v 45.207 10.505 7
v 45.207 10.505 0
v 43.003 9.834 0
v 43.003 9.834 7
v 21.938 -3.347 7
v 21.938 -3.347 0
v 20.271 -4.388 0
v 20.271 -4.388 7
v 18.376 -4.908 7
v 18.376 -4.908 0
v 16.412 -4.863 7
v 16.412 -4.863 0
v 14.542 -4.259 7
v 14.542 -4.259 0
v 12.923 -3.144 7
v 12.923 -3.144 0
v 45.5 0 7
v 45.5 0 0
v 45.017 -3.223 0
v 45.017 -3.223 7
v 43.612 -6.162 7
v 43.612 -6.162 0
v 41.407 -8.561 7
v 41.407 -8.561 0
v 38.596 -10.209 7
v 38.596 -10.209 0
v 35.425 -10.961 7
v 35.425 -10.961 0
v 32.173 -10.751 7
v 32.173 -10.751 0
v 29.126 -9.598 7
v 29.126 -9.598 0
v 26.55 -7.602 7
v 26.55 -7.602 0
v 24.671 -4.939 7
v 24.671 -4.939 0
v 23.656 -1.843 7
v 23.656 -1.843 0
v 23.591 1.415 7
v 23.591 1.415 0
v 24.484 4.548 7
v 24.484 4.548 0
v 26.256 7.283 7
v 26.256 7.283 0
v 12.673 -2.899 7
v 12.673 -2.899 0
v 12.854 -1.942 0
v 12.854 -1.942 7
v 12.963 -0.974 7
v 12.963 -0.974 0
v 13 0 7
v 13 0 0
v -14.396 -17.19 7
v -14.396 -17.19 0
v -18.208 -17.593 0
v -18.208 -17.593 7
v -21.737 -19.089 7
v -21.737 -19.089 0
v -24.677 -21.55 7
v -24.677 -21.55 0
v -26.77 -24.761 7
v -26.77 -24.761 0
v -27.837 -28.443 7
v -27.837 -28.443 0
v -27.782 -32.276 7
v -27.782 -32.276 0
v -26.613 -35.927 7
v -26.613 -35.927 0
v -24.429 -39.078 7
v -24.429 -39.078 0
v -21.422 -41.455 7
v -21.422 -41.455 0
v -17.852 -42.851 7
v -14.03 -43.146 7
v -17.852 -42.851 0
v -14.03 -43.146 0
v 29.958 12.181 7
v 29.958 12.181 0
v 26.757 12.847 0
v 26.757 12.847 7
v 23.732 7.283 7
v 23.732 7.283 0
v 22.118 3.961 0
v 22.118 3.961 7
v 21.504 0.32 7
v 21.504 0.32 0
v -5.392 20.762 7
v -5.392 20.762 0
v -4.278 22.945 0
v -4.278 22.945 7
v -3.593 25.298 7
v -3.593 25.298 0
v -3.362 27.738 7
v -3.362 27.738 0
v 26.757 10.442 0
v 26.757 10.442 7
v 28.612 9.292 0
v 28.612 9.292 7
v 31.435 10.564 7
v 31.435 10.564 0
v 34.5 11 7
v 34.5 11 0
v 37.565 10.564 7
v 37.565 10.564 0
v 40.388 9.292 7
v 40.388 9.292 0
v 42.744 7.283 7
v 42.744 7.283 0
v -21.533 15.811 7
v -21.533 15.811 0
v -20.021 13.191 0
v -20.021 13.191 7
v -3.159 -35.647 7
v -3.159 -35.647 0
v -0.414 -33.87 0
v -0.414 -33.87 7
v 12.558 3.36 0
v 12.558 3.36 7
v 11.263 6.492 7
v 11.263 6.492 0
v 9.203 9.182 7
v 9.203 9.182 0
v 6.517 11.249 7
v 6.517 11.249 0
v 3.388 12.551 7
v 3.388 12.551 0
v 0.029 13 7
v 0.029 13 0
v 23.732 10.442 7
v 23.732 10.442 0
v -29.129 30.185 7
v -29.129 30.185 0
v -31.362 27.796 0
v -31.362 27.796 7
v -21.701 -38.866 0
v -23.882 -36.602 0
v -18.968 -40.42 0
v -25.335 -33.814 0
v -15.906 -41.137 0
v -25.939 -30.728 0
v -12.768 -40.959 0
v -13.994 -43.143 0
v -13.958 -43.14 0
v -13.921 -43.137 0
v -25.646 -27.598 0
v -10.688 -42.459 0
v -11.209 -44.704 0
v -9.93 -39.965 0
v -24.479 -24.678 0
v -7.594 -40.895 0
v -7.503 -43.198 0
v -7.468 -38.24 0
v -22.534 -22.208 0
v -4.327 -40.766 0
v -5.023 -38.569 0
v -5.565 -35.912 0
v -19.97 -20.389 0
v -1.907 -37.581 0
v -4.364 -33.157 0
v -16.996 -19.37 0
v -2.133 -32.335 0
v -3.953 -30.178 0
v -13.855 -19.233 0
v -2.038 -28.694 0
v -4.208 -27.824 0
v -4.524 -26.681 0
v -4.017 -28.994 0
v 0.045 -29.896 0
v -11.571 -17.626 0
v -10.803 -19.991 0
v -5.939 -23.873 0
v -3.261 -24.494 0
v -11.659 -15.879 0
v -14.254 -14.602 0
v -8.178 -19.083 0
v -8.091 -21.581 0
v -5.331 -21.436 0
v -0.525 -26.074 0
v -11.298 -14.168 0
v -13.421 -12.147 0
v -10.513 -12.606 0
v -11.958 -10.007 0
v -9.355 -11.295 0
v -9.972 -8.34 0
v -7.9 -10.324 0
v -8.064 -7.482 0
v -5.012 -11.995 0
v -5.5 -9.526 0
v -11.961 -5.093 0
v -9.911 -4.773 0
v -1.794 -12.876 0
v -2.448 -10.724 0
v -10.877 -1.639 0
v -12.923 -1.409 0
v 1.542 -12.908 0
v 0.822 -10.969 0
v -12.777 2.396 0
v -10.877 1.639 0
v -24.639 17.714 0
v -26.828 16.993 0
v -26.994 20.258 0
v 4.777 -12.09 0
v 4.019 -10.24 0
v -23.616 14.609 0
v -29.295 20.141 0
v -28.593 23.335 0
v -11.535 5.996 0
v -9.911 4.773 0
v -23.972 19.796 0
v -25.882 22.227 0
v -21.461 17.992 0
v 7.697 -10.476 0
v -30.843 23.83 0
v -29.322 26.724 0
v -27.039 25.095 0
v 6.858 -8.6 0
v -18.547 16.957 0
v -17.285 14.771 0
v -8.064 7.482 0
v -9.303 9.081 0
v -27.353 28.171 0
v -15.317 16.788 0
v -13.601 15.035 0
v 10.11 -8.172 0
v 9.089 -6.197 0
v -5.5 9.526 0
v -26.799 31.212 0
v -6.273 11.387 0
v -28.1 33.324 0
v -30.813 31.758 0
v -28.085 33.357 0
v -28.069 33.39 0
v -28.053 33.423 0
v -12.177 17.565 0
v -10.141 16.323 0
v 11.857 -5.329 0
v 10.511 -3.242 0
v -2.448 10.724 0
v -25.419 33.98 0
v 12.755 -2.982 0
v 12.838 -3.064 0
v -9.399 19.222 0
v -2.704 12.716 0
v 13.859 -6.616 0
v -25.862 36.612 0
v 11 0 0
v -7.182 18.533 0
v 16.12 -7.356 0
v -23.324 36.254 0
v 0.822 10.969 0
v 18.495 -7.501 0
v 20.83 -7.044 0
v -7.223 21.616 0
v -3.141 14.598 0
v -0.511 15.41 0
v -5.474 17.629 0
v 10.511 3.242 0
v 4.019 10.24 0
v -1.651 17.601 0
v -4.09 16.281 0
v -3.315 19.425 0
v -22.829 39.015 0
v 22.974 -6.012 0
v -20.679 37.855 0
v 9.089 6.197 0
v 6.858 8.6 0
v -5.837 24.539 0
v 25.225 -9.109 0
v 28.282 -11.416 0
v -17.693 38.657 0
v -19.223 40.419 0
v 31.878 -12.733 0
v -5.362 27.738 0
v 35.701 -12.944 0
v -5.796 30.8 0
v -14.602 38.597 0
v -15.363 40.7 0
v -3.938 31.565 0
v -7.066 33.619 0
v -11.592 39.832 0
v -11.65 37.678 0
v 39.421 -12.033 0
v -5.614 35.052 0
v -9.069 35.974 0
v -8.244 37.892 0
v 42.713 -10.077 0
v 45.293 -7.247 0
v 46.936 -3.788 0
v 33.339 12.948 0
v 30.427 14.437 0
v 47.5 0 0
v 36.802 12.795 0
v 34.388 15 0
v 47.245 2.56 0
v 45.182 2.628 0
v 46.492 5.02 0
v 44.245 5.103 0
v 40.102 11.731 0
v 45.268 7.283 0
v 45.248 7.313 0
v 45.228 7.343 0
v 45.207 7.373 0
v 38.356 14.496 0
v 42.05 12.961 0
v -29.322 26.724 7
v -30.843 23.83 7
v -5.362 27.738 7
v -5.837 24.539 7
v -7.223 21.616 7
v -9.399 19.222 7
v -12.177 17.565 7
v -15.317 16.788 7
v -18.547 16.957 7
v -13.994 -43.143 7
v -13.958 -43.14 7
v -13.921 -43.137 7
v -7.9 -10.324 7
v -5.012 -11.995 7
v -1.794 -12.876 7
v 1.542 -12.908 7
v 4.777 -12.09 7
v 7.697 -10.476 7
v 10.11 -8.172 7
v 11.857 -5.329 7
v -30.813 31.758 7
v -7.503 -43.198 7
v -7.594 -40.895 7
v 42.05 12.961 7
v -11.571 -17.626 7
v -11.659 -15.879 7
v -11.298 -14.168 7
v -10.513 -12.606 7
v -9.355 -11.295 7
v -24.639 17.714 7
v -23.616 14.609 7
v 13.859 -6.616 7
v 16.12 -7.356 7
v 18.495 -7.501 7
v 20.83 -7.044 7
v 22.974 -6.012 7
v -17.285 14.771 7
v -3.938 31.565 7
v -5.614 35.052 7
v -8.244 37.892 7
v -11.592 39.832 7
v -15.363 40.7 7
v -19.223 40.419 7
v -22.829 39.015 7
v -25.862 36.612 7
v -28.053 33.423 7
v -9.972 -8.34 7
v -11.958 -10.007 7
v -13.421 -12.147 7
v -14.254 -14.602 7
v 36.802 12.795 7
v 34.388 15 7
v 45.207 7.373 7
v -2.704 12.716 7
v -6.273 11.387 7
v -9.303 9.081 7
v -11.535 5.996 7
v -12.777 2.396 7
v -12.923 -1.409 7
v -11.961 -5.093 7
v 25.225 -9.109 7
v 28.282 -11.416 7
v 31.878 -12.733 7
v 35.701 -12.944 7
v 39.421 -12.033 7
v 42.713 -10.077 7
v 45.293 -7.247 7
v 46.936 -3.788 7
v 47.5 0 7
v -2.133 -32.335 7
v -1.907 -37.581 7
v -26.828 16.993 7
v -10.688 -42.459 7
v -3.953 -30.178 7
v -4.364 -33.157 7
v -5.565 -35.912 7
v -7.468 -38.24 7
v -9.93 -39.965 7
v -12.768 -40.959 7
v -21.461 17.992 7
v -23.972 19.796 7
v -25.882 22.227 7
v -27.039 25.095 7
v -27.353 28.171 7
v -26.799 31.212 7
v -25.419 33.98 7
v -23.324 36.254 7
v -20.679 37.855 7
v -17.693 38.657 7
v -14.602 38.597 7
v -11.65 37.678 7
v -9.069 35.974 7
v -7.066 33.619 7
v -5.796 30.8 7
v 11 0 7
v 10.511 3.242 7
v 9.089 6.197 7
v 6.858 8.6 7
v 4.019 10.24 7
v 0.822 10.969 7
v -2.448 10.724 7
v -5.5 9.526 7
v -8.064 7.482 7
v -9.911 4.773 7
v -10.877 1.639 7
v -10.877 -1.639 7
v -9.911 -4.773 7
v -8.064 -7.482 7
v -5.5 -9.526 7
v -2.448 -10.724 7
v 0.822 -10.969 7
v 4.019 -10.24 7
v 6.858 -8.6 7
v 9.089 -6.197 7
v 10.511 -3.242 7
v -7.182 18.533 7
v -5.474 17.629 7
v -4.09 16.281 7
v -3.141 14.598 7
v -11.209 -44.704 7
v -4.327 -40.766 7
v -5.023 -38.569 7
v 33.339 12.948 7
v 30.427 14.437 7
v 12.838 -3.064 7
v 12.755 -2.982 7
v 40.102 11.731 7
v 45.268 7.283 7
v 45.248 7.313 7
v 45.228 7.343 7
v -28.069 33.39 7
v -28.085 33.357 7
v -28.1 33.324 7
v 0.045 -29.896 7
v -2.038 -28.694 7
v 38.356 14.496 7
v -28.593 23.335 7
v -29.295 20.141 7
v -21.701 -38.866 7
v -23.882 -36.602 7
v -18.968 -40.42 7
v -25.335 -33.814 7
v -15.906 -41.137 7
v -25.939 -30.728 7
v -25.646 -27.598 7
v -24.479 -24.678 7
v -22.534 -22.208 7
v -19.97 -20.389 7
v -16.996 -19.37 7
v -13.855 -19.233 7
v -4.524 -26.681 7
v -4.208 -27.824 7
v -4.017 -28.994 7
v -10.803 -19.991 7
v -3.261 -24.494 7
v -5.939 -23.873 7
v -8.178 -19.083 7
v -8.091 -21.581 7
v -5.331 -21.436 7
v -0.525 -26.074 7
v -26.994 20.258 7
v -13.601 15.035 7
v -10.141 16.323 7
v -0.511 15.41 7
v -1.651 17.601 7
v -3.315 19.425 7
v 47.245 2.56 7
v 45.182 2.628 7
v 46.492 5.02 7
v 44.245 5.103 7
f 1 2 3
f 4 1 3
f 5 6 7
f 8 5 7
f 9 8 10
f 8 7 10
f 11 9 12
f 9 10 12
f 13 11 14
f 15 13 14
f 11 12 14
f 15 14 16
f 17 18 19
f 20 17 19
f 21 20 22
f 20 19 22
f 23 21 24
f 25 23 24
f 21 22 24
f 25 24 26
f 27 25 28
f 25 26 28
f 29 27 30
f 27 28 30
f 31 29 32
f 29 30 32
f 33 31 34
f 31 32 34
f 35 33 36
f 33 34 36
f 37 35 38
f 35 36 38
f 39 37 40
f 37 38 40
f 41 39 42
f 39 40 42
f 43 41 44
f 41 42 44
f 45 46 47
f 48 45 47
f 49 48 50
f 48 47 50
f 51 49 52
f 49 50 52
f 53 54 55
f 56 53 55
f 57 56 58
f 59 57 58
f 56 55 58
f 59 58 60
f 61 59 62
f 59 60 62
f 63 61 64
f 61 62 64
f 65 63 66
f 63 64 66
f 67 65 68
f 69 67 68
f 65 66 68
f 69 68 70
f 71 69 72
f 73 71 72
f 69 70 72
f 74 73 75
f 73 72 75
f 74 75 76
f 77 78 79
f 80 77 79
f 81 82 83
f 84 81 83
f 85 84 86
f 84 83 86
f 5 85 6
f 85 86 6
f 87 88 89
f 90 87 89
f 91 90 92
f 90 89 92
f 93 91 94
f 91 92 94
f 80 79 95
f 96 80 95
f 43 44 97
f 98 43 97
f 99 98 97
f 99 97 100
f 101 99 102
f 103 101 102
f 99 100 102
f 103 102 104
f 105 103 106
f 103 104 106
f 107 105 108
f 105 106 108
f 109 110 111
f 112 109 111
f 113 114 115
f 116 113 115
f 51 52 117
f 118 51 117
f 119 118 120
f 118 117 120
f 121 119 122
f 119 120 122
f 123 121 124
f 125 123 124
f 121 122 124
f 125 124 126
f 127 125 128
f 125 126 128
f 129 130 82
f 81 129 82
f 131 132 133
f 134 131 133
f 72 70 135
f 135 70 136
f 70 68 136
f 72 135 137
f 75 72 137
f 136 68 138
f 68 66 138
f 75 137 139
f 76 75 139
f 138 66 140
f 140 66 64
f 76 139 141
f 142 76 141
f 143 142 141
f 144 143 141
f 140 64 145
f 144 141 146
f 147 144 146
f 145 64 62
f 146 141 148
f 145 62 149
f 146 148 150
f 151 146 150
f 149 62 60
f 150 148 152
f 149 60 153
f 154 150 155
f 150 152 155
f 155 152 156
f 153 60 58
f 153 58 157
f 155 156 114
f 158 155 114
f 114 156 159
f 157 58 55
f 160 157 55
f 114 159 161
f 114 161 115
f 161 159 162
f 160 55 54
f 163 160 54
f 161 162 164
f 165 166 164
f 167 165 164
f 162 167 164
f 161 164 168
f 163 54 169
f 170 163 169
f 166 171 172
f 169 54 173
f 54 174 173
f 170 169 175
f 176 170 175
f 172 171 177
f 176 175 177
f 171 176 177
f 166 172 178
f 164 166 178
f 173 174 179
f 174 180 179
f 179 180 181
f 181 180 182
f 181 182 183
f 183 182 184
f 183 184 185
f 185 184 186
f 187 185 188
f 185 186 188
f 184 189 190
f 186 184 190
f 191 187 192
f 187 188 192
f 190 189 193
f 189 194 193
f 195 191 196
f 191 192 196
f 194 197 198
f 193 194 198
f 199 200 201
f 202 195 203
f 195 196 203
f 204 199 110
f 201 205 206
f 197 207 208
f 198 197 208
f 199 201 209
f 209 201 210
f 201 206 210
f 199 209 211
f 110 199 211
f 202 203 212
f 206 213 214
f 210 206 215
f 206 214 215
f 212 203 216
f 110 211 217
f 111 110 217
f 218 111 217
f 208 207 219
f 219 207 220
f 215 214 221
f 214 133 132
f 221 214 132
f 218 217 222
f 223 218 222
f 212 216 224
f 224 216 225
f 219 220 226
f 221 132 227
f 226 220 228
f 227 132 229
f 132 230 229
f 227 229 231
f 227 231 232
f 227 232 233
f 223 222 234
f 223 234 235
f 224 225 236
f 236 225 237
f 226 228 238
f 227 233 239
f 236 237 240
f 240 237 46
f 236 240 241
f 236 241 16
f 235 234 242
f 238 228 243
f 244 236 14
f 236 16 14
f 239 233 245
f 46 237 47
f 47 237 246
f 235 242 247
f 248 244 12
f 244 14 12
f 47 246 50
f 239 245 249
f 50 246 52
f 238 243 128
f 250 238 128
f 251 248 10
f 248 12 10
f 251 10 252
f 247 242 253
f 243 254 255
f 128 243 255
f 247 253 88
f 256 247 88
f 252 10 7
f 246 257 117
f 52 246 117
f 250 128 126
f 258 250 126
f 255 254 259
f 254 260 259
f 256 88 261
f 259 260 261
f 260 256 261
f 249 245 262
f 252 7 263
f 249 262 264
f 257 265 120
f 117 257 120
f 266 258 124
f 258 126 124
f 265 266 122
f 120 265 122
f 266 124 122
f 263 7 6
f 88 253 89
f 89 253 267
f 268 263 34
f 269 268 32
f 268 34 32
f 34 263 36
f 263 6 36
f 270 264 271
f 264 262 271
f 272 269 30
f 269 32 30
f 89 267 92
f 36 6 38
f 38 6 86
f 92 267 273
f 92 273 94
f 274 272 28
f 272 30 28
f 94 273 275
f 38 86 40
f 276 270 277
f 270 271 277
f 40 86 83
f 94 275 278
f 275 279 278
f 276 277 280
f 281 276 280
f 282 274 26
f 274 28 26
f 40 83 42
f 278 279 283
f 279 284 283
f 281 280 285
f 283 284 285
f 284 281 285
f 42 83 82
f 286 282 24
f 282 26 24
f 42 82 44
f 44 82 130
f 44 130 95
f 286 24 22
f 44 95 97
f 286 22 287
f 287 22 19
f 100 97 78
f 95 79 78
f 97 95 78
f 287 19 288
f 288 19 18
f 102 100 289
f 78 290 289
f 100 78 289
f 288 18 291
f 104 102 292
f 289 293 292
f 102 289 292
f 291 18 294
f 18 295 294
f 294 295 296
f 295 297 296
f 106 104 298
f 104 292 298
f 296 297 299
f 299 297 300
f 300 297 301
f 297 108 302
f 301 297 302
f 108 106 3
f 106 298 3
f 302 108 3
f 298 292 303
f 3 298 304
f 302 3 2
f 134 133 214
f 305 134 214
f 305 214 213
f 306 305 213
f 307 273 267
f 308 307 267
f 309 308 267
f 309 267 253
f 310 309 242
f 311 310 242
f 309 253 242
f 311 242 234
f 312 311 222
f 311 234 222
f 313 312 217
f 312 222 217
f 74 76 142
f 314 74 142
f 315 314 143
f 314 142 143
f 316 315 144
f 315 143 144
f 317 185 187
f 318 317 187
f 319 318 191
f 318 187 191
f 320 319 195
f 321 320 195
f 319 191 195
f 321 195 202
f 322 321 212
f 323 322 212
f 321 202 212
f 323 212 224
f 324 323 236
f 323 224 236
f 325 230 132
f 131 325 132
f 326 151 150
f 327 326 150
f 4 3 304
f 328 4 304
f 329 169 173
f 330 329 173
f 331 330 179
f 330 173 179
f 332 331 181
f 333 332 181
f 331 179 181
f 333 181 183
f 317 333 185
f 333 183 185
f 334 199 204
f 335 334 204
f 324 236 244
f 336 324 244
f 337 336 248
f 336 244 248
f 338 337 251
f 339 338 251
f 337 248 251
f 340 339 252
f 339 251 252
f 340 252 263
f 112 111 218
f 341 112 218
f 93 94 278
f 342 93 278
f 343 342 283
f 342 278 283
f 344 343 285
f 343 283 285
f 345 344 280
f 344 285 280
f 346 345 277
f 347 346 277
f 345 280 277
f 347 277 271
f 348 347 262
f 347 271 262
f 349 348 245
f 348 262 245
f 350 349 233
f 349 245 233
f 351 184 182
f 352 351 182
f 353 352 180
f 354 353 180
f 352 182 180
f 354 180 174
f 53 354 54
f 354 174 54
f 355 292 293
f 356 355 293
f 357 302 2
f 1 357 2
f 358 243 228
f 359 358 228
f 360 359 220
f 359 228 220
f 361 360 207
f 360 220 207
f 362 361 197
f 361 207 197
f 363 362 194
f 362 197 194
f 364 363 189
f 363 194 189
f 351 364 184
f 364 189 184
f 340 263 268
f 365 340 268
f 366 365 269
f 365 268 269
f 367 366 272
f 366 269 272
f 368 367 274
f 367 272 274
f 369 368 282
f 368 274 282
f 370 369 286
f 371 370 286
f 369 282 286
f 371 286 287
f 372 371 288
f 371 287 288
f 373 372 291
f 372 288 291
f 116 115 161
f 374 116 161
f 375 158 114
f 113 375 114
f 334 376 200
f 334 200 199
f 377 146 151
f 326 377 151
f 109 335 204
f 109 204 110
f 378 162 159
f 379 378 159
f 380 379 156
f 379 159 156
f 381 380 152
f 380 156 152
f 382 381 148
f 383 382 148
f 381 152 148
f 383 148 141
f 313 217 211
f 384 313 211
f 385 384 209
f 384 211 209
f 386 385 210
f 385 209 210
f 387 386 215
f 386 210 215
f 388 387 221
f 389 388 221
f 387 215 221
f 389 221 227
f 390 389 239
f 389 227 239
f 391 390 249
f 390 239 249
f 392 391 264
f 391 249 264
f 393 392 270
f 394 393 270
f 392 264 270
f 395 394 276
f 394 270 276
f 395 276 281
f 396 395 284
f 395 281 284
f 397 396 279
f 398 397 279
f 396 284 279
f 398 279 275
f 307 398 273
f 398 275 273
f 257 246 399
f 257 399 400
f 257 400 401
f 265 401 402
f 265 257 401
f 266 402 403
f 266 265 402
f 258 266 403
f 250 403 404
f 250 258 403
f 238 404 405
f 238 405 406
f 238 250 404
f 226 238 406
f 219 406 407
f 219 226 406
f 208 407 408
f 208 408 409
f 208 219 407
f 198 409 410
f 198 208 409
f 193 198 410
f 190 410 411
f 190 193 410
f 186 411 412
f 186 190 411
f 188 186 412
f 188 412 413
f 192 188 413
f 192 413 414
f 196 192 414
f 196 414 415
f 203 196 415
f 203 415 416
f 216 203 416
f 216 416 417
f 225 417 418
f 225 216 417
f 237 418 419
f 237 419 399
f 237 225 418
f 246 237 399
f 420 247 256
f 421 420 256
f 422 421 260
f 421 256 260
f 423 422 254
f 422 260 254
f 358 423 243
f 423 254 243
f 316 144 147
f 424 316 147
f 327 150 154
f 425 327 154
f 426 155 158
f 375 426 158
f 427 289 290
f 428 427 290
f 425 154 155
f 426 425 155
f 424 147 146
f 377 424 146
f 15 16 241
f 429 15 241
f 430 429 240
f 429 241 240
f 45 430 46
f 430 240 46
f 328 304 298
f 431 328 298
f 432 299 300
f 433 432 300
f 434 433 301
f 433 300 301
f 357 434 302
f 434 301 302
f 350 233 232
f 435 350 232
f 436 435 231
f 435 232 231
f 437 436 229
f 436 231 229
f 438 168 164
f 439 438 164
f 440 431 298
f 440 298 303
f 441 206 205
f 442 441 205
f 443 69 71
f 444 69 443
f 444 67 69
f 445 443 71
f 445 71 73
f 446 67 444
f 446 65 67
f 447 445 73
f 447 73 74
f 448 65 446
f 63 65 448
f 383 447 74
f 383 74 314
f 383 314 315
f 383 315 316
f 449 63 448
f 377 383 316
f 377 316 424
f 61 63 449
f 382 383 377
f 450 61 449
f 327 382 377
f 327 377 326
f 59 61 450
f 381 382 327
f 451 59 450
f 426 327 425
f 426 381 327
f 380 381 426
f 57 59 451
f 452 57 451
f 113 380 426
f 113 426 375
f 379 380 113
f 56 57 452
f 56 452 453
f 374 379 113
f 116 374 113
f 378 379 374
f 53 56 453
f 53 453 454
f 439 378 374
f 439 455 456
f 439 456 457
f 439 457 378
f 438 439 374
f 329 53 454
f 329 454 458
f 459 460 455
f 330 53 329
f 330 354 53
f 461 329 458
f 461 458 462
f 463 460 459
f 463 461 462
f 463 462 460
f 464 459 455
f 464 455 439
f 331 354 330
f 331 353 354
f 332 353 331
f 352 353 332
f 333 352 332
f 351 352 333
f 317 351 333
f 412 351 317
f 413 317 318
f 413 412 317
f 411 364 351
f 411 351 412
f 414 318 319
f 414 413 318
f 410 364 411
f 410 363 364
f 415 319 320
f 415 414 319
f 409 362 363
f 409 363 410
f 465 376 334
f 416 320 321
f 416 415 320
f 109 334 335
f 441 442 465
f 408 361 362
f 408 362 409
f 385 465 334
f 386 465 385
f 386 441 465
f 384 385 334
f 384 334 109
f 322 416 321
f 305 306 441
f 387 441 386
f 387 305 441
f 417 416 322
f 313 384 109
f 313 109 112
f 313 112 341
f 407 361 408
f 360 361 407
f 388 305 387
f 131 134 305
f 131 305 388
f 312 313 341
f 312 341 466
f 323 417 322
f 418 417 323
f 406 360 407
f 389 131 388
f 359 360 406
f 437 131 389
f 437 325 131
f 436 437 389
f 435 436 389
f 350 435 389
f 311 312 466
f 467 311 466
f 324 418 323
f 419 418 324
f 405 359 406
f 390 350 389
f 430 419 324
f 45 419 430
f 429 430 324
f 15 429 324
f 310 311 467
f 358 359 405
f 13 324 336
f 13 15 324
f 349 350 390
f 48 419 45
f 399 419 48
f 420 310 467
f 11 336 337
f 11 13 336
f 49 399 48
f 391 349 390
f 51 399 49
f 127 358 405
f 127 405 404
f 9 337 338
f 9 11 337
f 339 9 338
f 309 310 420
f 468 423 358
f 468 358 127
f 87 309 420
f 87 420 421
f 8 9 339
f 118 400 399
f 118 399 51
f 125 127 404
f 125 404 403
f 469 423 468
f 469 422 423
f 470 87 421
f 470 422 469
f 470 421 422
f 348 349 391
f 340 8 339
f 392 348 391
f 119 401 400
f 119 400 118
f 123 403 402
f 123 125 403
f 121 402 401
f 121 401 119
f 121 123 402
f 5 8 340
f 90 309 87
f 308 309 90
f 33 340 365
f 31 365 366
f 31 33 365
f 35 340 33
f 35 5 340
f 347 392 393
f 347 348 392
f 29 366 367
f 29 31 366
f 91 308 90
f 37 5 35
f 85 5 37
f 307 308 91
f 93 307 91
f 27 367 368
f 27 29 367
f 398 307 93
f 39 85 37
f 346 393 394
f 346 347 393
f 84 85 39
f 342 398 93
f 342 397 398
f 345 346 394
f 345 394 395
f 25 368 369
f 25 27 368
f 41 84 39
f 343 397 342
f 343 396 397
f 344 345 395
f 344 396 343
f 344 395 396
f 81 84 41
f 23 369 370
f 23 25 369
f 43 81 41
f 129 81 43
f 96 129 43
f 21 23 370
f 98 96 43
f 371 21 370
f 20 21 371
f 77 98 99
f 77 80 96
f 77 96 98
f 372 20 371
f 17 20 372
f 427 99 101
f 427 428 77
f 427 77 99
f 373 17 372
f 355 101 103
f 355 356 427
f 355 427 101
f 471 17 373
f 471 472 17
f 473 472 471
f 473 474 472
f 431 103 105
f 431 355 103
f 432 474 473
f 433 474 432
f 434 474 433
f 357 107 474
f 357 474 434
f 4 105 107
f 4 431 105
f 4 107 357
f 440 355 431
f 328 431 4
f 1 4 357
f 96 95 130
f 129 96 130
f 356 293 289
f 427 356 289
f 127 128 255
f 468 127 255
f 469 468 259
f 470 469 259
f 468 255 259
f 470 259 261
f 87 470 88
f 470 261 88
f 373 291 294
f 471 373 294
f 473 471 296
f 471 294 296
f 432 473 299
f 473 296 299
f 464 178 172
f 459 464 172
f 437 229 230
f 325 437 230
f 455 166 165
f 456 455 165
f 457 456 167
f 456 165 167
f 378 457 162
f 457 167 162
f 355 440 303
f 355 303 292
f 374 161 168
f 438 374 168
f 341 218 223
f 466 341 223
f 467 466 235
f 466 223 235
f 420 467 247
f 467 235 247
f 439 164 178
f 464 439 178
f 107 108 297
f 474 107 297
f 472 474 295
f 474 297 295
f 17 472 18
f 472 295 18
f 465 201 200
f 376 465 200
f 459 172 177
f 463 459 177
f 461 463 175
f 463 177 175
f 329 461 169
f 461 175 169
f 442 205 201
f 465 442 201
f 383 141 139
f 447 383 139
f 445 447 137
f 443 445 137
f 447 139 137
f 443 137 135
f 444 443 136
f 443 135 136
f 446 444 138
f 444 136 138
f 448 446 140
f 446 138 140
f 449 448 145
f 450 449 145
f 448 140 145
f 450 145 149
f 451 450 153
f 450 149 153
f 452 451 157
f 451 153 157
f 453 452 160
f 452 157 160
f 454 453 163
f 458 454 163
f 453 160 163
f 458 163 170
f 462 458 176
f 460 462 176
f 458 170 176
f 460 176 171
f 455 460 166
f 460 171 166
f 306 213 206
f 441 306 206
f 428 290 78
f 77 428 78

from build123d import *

# Parameters (mm, degrees)
F0_R     = 11
F1_DEPTH = 7


# Not quite as in the source:
# - a feature names something its author has since deleted; it is built from what else it names


with BuildPart() as f1:
    # F0 (on Top) → F1 (new body)
    with BuildSketch(Plane.XY):
        with BuildLine():
            ThreePointArc((42.7437567563, 7.2828891618), (44.7878891013, 3.8934994337), (45.5, 0))
            ThreePointArc((45.5, 0), (30.6065005663, -10.2878891013), (26.2562432437, 7.2828891618))
            Line((26.2562432437, 7.2828891618), (23.7315495331, 7.2828891618))
            ThreePointArc((23.7315495331, 7.2828891618), (21.6811026337, 2.16237608), (21.9383596578, -3.3474157066))
            ThreePointArc((21.9383596578, -3.3474157066), (22.3825285727, -4.708172279), (22.9736088848, -6.0118472917))
            ThreePointArc((22.9736088848, -6.0118472917), (37.5949083591, -12.6262243861), (47.5, 0))
            ThreePointArc((47.5, 0), (46.9295988686, 3.8085524764), (45.2684504669, 7.2828891618))
            Line((45.2684504669, 7.2828891618), (42.7437567563, 7.2828891618))
        make_face()
        with BuildLine():
            ThreePointArc((26.2562432437, 7.2828891618), (34.5, 11), (42.7437567563, 7.2828891618))
            Line((42.7437567563, 7.2828891618), (45.2684504669, 7.2828891618))
            ThreePointArc((45.2684504669, 7.2828891618), (45.2378577502, 7.3279199597), (45.207076728, 7.3728222508))
            ThreePointArc((45.207076728, 7.3728222508), (44.1835161526, 8.6734949658), (43.0029894611, 9.8335736243))
            ThreePointArc((43.0029894611, 9.8335736243), (41.6158857772, 10.879529843), (40.1017032771, 11.7311943295))
            ThreePointArc((40.1017032771, 11.7311943295), (38.4874829399, 12.3733576609), (36.8020522674, 12.7945517842))
            ThreePointArc((36.8020522674, 12.7945517842), (35.0755104688, 12.9872548177), (33.3386909351, 12.9480253806))
            ThreePointArc((33.3386909351, 12.9480253806), (31.6226106019, 12.6775640504), (29.9579160343, 12.1807008521))
            ThreePointArc((29.9579160343, 12.1807008521), (28.2960857777, 11.4241607272), (26.7566463688, 10.442244708))
            ThreePointArc((26.7566463688, 10.442244708), (25.1102659991, 8.9907116177), (23.7315495331, 7.2828891618))
            Line((23.7315495331, 7.2828891618), (26.2562432437, 7.2828891618))
        make_face()
        with BuildLine():
            Line((23.7315495331, 10.442244708), (23.7315495331, 7.2828891618))
            ThreePointArc((23.7315495331, 7.2828891618), (25.1102659991, 8.9907116177), (26.7566463688, 10.442244708))
            Line((26.7566463688, 10.442244708), (23.7315495331, 10.442244708))
        make_face()
        with BuildLine():
            ThreePointArc((43.0029894611, 9.8335736243), (44.1835161526, 8.6734949658), (45.207076728, 7.3728222508))
            Line((45.207076728, 7.3728222508), (45.207076728, 10.5051657741))
            Line((45.207076728, 10.5051657741), (43.0029894611, 9.8335736243))
        make_face()
        with BuildLine():
            Line((26.7566463688, 12.8468079515), (26.7566463688, 10.442244708))
            ThreePointArc((26.7566463688, 10.442244708), (28.2960857777, 11.4241607272), (29.9579160343, 12.1807008521))
            Line((29.9579160343, 12.1807008521), (26.7566463688, 12.8468079515))
        make_face()
        with BuildLine():
            ThreePointArc((22.9736088848, -6.0118472917), (22.3825285727, -4.708172279), (21.9383596578, -3.3474157066))
            ThreePointArc((21.9383596578, -3.3474157066), (17.3922362251, -4.9568983328), (12.9232065297, -3.1443183566))
            ThreePointArc((12.9232065297, -3.1443183566), (12.7963014273, -3.0234598131), (12.6725554503, -2.8993686138))
            ThreePointArc((12.6725554503, -2.8993686138), (12.3249994875, -4.1345359635), (11.8573707885, -5.3294237947))
            ThreePointArc((11.8573707885, -5.3294237947), (17.3029186127, -7.5043480898), (22.9736088848, -6.0118472917))
        make_face()
        with BuildLine():
            ThreePointArc((40.1017032771, 11.7311943295), (41.6158857772, 10.879529843), (43.0029894611, 9.8335736243))
            Line((43.0029894611, 9.8335736243), (42.0499218924, 12.9614304542))
            Line((42.0499218924, 12.9614304542), (40.1017032771, 11.7311943295))
        make_face()
        with BuildLine():
            Line((30.4272975488, 14.4365194817), (29.9579160343, 12.1807008521))
            ThreePointArc((29.9579160343, 12.1807008521), (31.6226106019, 12.6775640504), (33.3386909351, 12.9480253806))
            Line((33.3386909351, 12.9480253806), (30.4272975488, 14.4365194817))
        make_face()
        with BuildLine():
            ThreePointArc((-7.9002965036, -10.3240164255), (3.1860787986, -12.603527359), (11.8573707885, -5.3294237947))
            ThreePointArc((11.8573707885, -5.3294237947), (12.3249994875, -4.1345359635), (12.6725554503, -2.8993686138))
            ThreePointArc((12.6725554503, -2.8993686138), (12.9178794865, -1.4589001244), (13, 0))
            ThreePointArc((13, 0), (9.2025905119, 9.1821744631), (0.0288726353, 12.9999679373))
            ThreePointArc((0.0288726353, 12.9999679373), (-1.3452884897, 12.9302049048), (-2.7043793136, 12.715594069))
            ThreePointArc((-2.7043793136, 12.715594069), (-12.2885029344, 4.2417797718), (-9.9723418366, -8.339808049))
            ThreePointArc((-9.9723418366, -8.339808049), (-8.9912218875, -9.3892453887), (-7.9002965036, -10.3240164255))
        make_face()
        Circle(F0_R, mode=Mode.SUBTRACT)
        with BuildLine():
            ThreePointArc((36.8020522674, 12.7945517842), (38.4874829399, 12.3733576609), (40.1017032771, 11.7311943295))
            Line((40.1017032771, 11.7311943295), (38.3558547697, 14.4959437083))
            Line((38.3558547697, 14.4959437083), (36.8020522674, 12.7945517842))
        make_face()
        with BuildLine():
            Line((34.3875787435, 14.9995787095), (33.3386909351, 12.9480253806))
            ThreePointArc((33.3386909351, 12.9480253806), (35.0755104688, 12.9872548177), (36.8020522674, 12.7945517842))
            Line((36.8020522674, 12.7945517842), (34.3875787435, 14.9995787095))
        make_face()
        with BuildLine():
            ThreePointArc((-11.5709617185, -17.6259791714), (-10.9561833098, -13.361430461), (-7.9002965036, -10.3240164255))
            ThreePointArc((-7.9002965036, -10.3240164255), (-8.9912218875, -9.3892453887), (-9.9723418366, -8.339808049))
            ThreePointArc((-9.9723418366, -8.339808049), (-13.420933272, -12.1469092689), (-14.3960517714, -17.1903155086))
            ThreePointArc((-14.3960517714, -17.1903155086), (-12.971495936, -17.3302624491), (-11.5709617185, -17.6259791714))
        make_face()
        with BuildLine():
            ThreePointArc((-3.2614425902, -24.4940795914), (-6.6707135497, -20.1580839465), (-11.5709617185, -17.6259791714))
            ThreePointArc((-11.5709617185, -17.6259791714), (-12.971495936, -17.3302624491), (-14.3960517714, -17.1903155086))
            ThreePointArc((-14.3960517714, -17.1903155086), (-27.9515414405, -30.3617633129), (-14.0298930571, -43.1455829188))
            Line((-14.0298930571, -43.1455829188), (-12.7675462018, -40.9591340287))
            ThreePointArc((-12.7675462018, -40.9591340287), (-24.4791142923, -24.6783866742), (-4.5237894455, -26.6805284815))
            Line((-4.5237894455, -26.6805284815), (-3.2614425902, -24.4940795914))
        make_face()
        with BuildLine():
            ThreePointArc((-2.7043793136, 12.715594069), (-1.3452884897, 12.9302049048), (0.0288726353, 12.9999679373))
            ThreePointArc((0.0288726353, 12.9999679373), (-1.6510654504, 17.6006925658), (-5.3920588945, 20.7619940589))
            ThreePointArc((-5.3920588945, 20.7619940589), (-6.2255344178, 19.5982659865), (-7.1818997204, 18.5332261365))
            ThreePointArc((-7.1818997204, 18.5332261365), (-4.0898299015, 16.2811568981), (-2.7043793136, 12.715594069))
        make_face()
        with BuildLine():
            Line((-0.5253604276, -26.0737573645), (-3.2614425902, -24.4940795914))
            ThreePointArc((-3.2614425902, -24.4940795914), (-2.4717831912, -26.5419943035), (-2.0379088454, -28.6935680732))
            Line((-2.0379088454, -28.6935680732), (-0.5253604276, -26.0737573645))
        make_face()
        with BuildLine():
            ThreePointArc((-2.0379088454, -28.6935680732), (-2.4717831912, -26.5419943035), (-3.2614425902, -24.4940795914))
            Line((-3.2614425902, -24.4940795914), (-4.5237894455, -26.6805284815))
            ThreePointArc((-4.5237894455, -26.6805284815), (-4.0965118208, -28.4063115428), (-3.9528348507, -30.1783866742))
            ThreePointArc((-3.9528348507, -30.1783866742), (-6.4370208809, -37.1412102704), (-12.7675462018, -40.9591340287))
            Line((-12.7675462018, -40.9591340287), (-14.0298930571, -43.1455829188))
            ThreePointArc((-14.0298930571, -43.1455829188), (-13.9755988838, -43.141604248), (-13.9213218479, -43.1373982463))
            ThreePointArc((-13.9213218479, -43.1373982463), (-12.283125947, -42.9013051432), (-10.6882050126, -42.4589783678))
            ThreePointArc((-10.6882050126, -42.4589783678), (-9.088828514, -41.7806894492), (-7.5941741832, -40.8952011814))
            ThreePointArc((-7.5941741832, -40.8952011814), (-6.2309342562, -39.8183270277), (-5.0234541092, -38.5692983107))
            ThreePointArc((-5.0234541092, -38.5692983107), (-3.9932974875, -37.1704207692), (-3.1588614098, -35.6466762127))
            ThreePointArc((-3.1588614098, -35.6466762127), (-2.5350476259, -34.0252763841), (-2.132996494, -32.3351769998))
            ThreePointArc((-2.132996494, -32.3351769998), (-1.9979535576, -31.2605376256), (-1.9528348507, -30.1783866742))
            ThreePointArc((-1.9528348507, -30.1783866742), (-1.9741207759, -29.4347597747), (-2.0379088454, -28.6935680732))
        make_face()
        with BuildLine():
            ThreePointArc((-7.1818997204, 18.5332261365), (-6.2255344178, 19.5982659865), (-5.3920588945, 20.7619940589))
            ThreePointArc((-5.3920588945, 20.7619940589), (-3.8795816786, 24.105375001), (-3.3616669305, 27.7382179327))
            ThreePointArc((-3.3616669305, 27.7382179327), (-13.4451706923, 40.40684255), (-28.0530591909, 33.4225250156))
            Line((-28.0530591909, 33.4225250156), (-26.7907123357, 31.2360761255))
            ThreePointArc((-26.7907123357, 31.2360761255), (-14.589591799, 38.5945409626), (-5.3616669305, 27.7382179327))
            ThreePointArc((-5.3616669305, 27.7382179327), (-9.3988433343, 19.2224039629), (-18.5469555793, 16.9574705783))
            Line((-18.5469555793, 16.9574705783), (-17.2846087241, 14.7710216882))
            ThreePointArc((-17.2846087241, 14.7710216882), (-11.8248908651, 15.555539125), (-7.1818997204, 18.5332261365))
        make_face()
        with BuildLine():
            Line((0.0445040084, -29.8958496949), (-2.0379088454, -28.6935680732))
            ThreePointArc((-2.0379088454, -28.6935680732), (-1.9741207759, -29.4347597747), (-1.9528348507, -30.1783866742))
            ThreePointArc((-1.9528348507, -30.1783866742), (-1.9979535576, -31.2605376256), (-2.132996494, -32.3351769998))
            Line((-2.132996494, -32.3351769998), (0.0445040084, -29.8958496949))
        make_face()
        with BuildLine():
            Line((-20.0206908867, 13.191343915), (-17.2846087241, 14.7710216882))
            ThreePointArc((-17.2846087241, 14.7710216882), (-19.452984589, 15.1111139443), (-21.5332393046, 15.8111546236))
            Line((-21.5332393046, 15.8111546236), (-20.0206908867, 13.191343915))
        make_face()
        with BuildLine():
            ThreePointArc((-21.5332393046, 15.8111546236), (-19.452984589, 15.1111139443), (-17.2846087241, 14.7710216882))
            Line((-17.2846087241, 14.7710216882), (-18.5469555793, 16.9574705783))
            ThreePointArc((-18.5469555793, 16.9574705783), (-25.8879463721, 22.2382179327), (-26.7907123357, 31.2360761255))
            Line((-26.7907123357, 31.2360761255), (-28.0530591909, 33.4225250156))
            ThreePointArc((-28.0530591909, 33.4225250156), (-28.0767606476, 33.3735155468), (-28.1002566612, 33.3244072541))
            ThreePointArc((-28.1002566612, 33.3244072541), (-28.7148919868, 31.7876414359), (-29.1292862296, 30.185236002))
            ThreePointArc((-29.1292862296, 30.185236002), (-29.3415590444, 28.4609908647), (-29.322030875, 26.7238381104))
            ThreePointArc((-29.322030875, 26.7238381104), (-29.0710504648, 25.0048006254), (-28.5930999393, 23.334577785))
            ThreePointArc((-28.5930999393, 23.334577785), (-27.8967147624, 21.74299721), (-26.9943313064, 20.2584820906))
            ThreePointArc((-26.9943313064, 20.2584820906), (-25.9020647571, 18.9075435922), (-24.6394213214, 17.7143074062))
            ThreePointArc((-24.6394213214, 17.7143074062), (-23.153323226, 16.6533902497), (-21.5332393046, 15.8111546236))
        make_face()
        with BuildLine():
            ThreePointArc((-10.6882050126, -42.4589783678), (-12.283125947, -42.9013051432), (-13.9213218479, -43.1373982463))
            Line((-13.9213218479, -43.1373982463), (-11.2086327833, -44.703570008))
            Line((-11.2086327833, -44.703570008), (-10.6882050126, -42.4589783678))
        make_face()
        with BuildLine():
            Line((-23.6156521584, 14.6088730019), (-21.5332393046, 15.8111546236))
            ThreePointArc((-21.5332393046, 15.8111546236), (-23.153323226, 16.6533902497), (-24.6394213214, 17.7143074062))
            Line((-24.6394213214, 17.7143074062), (-23.6156521584, 14.6088730019))
        make_face()
        with BuildLine():
            ThreePointArc((-7.5941741832, -40.8952011814), (-9.088828514, -41.7806894492), (-10.6882050126, -42.4589783678))
            Line((-10.6882050126, -42.4589783678), (-7.5028677542, -43.1975260567))
            Line((-7.5028677542, -43.1975260567), (-7.5941741832, -40.8952011814))
        make_face()
        with BuildLine():
            Line((-0.4140910118, -33.8695826303), (-2.132996494, -32.3351769998))
            ThreePointArc((-2.132996494, -32.3351769998), (-2.5350476259, -34.0252763841), (-3.1588614098, -35.6466762127))
            Line((-3.1588614098, -35.6466762127), (-0.4140910118, -33.8695826303))
        make_face()
        with BuildLine():
            ThreePointArc((-29.1292862296, 30.185236002), (-28.7148919868, 31.7876414359), (-28.1002566612, 33.3244072541))
            Line((-28.1002566612, 33.3244072541), (-30.8129457258, 31.7582354924))
            Line((-30.8129457258, 31.7582354924), (-29.1292862296, 30.185236002))
        make_face()
        with BuildLine():
            Line((-26.8277083182, 16.9928944072), (-24.6394213214, 17.7143074062))
            ThreePointArc((-24.6394213214, 17.7143074062), (-25.9020647571, 18.9075435922), (-26.9943313064, 20.2584820906))
            Line((-26.9943313064, 20.2584820906), (-26.8277083182, 16.9928944072))
        make_face()
        with BuildLine():
            ThreePointArc((-5.0234541092, -38.5692983107), (-6.2309342562, -39.8183270277), (-7.5941741832, -40.8952011814))
            Line((-7.5941741832, -40.8952011814), (-4.3269067323, -40.7656267122))
            Line((-4.3269067323, -40.7656267122), (-5.0234541092, -38.5692983107))
        make_face()
        with BuildLine():
            Line((-1.906608014, -37.5808163649), (-3.1588614098, -35.6466762127))
            ThreePointArc((-3.1588614098, -35.6466762127), (-3.9932974875, -37.1704207692), (-5.0234541092, -38.5692983107))
            Line((-5.0234541092, -38.5692983107), (-1.906608014, -37.5808163649))
        make_face()
        with BuildLine():
            ThreePointArc((-29.322030875, 26.7238381104), (-29.3415590444, 28.4609908647), (-29.1292862296, 30.185236002))
            Line((-29.1292862296, 30.185236002), (-31.3615559194, 27.795926861))
            Line((-31.3615559194, 27.795926861), (-29.322030875, 26.7238381104))
        make_face()
        with BuildLine():
            Line((-29.2954725106, 20.1410689139), (-26.9943313064, 20.2584820906))
            ThreePointArc((-26.9943313064, 20.2584820906), (-27.8967147624, 21.74299721), (-28.5930999393, 23.334577785))
            Line((-28.5930999393, 23.334577785), (-29.2954725106, 20.1410689139))
        make_face()
        with BuildLine():
            ThreePointArc((-28.5930999393, 23.334577785), (-29.0710504648, 25.0048006254), (-29.322030875, 26.7238381104))
            Line((-29.322030875, 26.7238381104), (-30.8434498185, 23.8295142624))
            Line((-30.8434498185, 23.8295142624), (-28.5930999393, 23.334577785))
        make_face()
    extrude(amount=F1_DEPTH)


solid = f1.part
